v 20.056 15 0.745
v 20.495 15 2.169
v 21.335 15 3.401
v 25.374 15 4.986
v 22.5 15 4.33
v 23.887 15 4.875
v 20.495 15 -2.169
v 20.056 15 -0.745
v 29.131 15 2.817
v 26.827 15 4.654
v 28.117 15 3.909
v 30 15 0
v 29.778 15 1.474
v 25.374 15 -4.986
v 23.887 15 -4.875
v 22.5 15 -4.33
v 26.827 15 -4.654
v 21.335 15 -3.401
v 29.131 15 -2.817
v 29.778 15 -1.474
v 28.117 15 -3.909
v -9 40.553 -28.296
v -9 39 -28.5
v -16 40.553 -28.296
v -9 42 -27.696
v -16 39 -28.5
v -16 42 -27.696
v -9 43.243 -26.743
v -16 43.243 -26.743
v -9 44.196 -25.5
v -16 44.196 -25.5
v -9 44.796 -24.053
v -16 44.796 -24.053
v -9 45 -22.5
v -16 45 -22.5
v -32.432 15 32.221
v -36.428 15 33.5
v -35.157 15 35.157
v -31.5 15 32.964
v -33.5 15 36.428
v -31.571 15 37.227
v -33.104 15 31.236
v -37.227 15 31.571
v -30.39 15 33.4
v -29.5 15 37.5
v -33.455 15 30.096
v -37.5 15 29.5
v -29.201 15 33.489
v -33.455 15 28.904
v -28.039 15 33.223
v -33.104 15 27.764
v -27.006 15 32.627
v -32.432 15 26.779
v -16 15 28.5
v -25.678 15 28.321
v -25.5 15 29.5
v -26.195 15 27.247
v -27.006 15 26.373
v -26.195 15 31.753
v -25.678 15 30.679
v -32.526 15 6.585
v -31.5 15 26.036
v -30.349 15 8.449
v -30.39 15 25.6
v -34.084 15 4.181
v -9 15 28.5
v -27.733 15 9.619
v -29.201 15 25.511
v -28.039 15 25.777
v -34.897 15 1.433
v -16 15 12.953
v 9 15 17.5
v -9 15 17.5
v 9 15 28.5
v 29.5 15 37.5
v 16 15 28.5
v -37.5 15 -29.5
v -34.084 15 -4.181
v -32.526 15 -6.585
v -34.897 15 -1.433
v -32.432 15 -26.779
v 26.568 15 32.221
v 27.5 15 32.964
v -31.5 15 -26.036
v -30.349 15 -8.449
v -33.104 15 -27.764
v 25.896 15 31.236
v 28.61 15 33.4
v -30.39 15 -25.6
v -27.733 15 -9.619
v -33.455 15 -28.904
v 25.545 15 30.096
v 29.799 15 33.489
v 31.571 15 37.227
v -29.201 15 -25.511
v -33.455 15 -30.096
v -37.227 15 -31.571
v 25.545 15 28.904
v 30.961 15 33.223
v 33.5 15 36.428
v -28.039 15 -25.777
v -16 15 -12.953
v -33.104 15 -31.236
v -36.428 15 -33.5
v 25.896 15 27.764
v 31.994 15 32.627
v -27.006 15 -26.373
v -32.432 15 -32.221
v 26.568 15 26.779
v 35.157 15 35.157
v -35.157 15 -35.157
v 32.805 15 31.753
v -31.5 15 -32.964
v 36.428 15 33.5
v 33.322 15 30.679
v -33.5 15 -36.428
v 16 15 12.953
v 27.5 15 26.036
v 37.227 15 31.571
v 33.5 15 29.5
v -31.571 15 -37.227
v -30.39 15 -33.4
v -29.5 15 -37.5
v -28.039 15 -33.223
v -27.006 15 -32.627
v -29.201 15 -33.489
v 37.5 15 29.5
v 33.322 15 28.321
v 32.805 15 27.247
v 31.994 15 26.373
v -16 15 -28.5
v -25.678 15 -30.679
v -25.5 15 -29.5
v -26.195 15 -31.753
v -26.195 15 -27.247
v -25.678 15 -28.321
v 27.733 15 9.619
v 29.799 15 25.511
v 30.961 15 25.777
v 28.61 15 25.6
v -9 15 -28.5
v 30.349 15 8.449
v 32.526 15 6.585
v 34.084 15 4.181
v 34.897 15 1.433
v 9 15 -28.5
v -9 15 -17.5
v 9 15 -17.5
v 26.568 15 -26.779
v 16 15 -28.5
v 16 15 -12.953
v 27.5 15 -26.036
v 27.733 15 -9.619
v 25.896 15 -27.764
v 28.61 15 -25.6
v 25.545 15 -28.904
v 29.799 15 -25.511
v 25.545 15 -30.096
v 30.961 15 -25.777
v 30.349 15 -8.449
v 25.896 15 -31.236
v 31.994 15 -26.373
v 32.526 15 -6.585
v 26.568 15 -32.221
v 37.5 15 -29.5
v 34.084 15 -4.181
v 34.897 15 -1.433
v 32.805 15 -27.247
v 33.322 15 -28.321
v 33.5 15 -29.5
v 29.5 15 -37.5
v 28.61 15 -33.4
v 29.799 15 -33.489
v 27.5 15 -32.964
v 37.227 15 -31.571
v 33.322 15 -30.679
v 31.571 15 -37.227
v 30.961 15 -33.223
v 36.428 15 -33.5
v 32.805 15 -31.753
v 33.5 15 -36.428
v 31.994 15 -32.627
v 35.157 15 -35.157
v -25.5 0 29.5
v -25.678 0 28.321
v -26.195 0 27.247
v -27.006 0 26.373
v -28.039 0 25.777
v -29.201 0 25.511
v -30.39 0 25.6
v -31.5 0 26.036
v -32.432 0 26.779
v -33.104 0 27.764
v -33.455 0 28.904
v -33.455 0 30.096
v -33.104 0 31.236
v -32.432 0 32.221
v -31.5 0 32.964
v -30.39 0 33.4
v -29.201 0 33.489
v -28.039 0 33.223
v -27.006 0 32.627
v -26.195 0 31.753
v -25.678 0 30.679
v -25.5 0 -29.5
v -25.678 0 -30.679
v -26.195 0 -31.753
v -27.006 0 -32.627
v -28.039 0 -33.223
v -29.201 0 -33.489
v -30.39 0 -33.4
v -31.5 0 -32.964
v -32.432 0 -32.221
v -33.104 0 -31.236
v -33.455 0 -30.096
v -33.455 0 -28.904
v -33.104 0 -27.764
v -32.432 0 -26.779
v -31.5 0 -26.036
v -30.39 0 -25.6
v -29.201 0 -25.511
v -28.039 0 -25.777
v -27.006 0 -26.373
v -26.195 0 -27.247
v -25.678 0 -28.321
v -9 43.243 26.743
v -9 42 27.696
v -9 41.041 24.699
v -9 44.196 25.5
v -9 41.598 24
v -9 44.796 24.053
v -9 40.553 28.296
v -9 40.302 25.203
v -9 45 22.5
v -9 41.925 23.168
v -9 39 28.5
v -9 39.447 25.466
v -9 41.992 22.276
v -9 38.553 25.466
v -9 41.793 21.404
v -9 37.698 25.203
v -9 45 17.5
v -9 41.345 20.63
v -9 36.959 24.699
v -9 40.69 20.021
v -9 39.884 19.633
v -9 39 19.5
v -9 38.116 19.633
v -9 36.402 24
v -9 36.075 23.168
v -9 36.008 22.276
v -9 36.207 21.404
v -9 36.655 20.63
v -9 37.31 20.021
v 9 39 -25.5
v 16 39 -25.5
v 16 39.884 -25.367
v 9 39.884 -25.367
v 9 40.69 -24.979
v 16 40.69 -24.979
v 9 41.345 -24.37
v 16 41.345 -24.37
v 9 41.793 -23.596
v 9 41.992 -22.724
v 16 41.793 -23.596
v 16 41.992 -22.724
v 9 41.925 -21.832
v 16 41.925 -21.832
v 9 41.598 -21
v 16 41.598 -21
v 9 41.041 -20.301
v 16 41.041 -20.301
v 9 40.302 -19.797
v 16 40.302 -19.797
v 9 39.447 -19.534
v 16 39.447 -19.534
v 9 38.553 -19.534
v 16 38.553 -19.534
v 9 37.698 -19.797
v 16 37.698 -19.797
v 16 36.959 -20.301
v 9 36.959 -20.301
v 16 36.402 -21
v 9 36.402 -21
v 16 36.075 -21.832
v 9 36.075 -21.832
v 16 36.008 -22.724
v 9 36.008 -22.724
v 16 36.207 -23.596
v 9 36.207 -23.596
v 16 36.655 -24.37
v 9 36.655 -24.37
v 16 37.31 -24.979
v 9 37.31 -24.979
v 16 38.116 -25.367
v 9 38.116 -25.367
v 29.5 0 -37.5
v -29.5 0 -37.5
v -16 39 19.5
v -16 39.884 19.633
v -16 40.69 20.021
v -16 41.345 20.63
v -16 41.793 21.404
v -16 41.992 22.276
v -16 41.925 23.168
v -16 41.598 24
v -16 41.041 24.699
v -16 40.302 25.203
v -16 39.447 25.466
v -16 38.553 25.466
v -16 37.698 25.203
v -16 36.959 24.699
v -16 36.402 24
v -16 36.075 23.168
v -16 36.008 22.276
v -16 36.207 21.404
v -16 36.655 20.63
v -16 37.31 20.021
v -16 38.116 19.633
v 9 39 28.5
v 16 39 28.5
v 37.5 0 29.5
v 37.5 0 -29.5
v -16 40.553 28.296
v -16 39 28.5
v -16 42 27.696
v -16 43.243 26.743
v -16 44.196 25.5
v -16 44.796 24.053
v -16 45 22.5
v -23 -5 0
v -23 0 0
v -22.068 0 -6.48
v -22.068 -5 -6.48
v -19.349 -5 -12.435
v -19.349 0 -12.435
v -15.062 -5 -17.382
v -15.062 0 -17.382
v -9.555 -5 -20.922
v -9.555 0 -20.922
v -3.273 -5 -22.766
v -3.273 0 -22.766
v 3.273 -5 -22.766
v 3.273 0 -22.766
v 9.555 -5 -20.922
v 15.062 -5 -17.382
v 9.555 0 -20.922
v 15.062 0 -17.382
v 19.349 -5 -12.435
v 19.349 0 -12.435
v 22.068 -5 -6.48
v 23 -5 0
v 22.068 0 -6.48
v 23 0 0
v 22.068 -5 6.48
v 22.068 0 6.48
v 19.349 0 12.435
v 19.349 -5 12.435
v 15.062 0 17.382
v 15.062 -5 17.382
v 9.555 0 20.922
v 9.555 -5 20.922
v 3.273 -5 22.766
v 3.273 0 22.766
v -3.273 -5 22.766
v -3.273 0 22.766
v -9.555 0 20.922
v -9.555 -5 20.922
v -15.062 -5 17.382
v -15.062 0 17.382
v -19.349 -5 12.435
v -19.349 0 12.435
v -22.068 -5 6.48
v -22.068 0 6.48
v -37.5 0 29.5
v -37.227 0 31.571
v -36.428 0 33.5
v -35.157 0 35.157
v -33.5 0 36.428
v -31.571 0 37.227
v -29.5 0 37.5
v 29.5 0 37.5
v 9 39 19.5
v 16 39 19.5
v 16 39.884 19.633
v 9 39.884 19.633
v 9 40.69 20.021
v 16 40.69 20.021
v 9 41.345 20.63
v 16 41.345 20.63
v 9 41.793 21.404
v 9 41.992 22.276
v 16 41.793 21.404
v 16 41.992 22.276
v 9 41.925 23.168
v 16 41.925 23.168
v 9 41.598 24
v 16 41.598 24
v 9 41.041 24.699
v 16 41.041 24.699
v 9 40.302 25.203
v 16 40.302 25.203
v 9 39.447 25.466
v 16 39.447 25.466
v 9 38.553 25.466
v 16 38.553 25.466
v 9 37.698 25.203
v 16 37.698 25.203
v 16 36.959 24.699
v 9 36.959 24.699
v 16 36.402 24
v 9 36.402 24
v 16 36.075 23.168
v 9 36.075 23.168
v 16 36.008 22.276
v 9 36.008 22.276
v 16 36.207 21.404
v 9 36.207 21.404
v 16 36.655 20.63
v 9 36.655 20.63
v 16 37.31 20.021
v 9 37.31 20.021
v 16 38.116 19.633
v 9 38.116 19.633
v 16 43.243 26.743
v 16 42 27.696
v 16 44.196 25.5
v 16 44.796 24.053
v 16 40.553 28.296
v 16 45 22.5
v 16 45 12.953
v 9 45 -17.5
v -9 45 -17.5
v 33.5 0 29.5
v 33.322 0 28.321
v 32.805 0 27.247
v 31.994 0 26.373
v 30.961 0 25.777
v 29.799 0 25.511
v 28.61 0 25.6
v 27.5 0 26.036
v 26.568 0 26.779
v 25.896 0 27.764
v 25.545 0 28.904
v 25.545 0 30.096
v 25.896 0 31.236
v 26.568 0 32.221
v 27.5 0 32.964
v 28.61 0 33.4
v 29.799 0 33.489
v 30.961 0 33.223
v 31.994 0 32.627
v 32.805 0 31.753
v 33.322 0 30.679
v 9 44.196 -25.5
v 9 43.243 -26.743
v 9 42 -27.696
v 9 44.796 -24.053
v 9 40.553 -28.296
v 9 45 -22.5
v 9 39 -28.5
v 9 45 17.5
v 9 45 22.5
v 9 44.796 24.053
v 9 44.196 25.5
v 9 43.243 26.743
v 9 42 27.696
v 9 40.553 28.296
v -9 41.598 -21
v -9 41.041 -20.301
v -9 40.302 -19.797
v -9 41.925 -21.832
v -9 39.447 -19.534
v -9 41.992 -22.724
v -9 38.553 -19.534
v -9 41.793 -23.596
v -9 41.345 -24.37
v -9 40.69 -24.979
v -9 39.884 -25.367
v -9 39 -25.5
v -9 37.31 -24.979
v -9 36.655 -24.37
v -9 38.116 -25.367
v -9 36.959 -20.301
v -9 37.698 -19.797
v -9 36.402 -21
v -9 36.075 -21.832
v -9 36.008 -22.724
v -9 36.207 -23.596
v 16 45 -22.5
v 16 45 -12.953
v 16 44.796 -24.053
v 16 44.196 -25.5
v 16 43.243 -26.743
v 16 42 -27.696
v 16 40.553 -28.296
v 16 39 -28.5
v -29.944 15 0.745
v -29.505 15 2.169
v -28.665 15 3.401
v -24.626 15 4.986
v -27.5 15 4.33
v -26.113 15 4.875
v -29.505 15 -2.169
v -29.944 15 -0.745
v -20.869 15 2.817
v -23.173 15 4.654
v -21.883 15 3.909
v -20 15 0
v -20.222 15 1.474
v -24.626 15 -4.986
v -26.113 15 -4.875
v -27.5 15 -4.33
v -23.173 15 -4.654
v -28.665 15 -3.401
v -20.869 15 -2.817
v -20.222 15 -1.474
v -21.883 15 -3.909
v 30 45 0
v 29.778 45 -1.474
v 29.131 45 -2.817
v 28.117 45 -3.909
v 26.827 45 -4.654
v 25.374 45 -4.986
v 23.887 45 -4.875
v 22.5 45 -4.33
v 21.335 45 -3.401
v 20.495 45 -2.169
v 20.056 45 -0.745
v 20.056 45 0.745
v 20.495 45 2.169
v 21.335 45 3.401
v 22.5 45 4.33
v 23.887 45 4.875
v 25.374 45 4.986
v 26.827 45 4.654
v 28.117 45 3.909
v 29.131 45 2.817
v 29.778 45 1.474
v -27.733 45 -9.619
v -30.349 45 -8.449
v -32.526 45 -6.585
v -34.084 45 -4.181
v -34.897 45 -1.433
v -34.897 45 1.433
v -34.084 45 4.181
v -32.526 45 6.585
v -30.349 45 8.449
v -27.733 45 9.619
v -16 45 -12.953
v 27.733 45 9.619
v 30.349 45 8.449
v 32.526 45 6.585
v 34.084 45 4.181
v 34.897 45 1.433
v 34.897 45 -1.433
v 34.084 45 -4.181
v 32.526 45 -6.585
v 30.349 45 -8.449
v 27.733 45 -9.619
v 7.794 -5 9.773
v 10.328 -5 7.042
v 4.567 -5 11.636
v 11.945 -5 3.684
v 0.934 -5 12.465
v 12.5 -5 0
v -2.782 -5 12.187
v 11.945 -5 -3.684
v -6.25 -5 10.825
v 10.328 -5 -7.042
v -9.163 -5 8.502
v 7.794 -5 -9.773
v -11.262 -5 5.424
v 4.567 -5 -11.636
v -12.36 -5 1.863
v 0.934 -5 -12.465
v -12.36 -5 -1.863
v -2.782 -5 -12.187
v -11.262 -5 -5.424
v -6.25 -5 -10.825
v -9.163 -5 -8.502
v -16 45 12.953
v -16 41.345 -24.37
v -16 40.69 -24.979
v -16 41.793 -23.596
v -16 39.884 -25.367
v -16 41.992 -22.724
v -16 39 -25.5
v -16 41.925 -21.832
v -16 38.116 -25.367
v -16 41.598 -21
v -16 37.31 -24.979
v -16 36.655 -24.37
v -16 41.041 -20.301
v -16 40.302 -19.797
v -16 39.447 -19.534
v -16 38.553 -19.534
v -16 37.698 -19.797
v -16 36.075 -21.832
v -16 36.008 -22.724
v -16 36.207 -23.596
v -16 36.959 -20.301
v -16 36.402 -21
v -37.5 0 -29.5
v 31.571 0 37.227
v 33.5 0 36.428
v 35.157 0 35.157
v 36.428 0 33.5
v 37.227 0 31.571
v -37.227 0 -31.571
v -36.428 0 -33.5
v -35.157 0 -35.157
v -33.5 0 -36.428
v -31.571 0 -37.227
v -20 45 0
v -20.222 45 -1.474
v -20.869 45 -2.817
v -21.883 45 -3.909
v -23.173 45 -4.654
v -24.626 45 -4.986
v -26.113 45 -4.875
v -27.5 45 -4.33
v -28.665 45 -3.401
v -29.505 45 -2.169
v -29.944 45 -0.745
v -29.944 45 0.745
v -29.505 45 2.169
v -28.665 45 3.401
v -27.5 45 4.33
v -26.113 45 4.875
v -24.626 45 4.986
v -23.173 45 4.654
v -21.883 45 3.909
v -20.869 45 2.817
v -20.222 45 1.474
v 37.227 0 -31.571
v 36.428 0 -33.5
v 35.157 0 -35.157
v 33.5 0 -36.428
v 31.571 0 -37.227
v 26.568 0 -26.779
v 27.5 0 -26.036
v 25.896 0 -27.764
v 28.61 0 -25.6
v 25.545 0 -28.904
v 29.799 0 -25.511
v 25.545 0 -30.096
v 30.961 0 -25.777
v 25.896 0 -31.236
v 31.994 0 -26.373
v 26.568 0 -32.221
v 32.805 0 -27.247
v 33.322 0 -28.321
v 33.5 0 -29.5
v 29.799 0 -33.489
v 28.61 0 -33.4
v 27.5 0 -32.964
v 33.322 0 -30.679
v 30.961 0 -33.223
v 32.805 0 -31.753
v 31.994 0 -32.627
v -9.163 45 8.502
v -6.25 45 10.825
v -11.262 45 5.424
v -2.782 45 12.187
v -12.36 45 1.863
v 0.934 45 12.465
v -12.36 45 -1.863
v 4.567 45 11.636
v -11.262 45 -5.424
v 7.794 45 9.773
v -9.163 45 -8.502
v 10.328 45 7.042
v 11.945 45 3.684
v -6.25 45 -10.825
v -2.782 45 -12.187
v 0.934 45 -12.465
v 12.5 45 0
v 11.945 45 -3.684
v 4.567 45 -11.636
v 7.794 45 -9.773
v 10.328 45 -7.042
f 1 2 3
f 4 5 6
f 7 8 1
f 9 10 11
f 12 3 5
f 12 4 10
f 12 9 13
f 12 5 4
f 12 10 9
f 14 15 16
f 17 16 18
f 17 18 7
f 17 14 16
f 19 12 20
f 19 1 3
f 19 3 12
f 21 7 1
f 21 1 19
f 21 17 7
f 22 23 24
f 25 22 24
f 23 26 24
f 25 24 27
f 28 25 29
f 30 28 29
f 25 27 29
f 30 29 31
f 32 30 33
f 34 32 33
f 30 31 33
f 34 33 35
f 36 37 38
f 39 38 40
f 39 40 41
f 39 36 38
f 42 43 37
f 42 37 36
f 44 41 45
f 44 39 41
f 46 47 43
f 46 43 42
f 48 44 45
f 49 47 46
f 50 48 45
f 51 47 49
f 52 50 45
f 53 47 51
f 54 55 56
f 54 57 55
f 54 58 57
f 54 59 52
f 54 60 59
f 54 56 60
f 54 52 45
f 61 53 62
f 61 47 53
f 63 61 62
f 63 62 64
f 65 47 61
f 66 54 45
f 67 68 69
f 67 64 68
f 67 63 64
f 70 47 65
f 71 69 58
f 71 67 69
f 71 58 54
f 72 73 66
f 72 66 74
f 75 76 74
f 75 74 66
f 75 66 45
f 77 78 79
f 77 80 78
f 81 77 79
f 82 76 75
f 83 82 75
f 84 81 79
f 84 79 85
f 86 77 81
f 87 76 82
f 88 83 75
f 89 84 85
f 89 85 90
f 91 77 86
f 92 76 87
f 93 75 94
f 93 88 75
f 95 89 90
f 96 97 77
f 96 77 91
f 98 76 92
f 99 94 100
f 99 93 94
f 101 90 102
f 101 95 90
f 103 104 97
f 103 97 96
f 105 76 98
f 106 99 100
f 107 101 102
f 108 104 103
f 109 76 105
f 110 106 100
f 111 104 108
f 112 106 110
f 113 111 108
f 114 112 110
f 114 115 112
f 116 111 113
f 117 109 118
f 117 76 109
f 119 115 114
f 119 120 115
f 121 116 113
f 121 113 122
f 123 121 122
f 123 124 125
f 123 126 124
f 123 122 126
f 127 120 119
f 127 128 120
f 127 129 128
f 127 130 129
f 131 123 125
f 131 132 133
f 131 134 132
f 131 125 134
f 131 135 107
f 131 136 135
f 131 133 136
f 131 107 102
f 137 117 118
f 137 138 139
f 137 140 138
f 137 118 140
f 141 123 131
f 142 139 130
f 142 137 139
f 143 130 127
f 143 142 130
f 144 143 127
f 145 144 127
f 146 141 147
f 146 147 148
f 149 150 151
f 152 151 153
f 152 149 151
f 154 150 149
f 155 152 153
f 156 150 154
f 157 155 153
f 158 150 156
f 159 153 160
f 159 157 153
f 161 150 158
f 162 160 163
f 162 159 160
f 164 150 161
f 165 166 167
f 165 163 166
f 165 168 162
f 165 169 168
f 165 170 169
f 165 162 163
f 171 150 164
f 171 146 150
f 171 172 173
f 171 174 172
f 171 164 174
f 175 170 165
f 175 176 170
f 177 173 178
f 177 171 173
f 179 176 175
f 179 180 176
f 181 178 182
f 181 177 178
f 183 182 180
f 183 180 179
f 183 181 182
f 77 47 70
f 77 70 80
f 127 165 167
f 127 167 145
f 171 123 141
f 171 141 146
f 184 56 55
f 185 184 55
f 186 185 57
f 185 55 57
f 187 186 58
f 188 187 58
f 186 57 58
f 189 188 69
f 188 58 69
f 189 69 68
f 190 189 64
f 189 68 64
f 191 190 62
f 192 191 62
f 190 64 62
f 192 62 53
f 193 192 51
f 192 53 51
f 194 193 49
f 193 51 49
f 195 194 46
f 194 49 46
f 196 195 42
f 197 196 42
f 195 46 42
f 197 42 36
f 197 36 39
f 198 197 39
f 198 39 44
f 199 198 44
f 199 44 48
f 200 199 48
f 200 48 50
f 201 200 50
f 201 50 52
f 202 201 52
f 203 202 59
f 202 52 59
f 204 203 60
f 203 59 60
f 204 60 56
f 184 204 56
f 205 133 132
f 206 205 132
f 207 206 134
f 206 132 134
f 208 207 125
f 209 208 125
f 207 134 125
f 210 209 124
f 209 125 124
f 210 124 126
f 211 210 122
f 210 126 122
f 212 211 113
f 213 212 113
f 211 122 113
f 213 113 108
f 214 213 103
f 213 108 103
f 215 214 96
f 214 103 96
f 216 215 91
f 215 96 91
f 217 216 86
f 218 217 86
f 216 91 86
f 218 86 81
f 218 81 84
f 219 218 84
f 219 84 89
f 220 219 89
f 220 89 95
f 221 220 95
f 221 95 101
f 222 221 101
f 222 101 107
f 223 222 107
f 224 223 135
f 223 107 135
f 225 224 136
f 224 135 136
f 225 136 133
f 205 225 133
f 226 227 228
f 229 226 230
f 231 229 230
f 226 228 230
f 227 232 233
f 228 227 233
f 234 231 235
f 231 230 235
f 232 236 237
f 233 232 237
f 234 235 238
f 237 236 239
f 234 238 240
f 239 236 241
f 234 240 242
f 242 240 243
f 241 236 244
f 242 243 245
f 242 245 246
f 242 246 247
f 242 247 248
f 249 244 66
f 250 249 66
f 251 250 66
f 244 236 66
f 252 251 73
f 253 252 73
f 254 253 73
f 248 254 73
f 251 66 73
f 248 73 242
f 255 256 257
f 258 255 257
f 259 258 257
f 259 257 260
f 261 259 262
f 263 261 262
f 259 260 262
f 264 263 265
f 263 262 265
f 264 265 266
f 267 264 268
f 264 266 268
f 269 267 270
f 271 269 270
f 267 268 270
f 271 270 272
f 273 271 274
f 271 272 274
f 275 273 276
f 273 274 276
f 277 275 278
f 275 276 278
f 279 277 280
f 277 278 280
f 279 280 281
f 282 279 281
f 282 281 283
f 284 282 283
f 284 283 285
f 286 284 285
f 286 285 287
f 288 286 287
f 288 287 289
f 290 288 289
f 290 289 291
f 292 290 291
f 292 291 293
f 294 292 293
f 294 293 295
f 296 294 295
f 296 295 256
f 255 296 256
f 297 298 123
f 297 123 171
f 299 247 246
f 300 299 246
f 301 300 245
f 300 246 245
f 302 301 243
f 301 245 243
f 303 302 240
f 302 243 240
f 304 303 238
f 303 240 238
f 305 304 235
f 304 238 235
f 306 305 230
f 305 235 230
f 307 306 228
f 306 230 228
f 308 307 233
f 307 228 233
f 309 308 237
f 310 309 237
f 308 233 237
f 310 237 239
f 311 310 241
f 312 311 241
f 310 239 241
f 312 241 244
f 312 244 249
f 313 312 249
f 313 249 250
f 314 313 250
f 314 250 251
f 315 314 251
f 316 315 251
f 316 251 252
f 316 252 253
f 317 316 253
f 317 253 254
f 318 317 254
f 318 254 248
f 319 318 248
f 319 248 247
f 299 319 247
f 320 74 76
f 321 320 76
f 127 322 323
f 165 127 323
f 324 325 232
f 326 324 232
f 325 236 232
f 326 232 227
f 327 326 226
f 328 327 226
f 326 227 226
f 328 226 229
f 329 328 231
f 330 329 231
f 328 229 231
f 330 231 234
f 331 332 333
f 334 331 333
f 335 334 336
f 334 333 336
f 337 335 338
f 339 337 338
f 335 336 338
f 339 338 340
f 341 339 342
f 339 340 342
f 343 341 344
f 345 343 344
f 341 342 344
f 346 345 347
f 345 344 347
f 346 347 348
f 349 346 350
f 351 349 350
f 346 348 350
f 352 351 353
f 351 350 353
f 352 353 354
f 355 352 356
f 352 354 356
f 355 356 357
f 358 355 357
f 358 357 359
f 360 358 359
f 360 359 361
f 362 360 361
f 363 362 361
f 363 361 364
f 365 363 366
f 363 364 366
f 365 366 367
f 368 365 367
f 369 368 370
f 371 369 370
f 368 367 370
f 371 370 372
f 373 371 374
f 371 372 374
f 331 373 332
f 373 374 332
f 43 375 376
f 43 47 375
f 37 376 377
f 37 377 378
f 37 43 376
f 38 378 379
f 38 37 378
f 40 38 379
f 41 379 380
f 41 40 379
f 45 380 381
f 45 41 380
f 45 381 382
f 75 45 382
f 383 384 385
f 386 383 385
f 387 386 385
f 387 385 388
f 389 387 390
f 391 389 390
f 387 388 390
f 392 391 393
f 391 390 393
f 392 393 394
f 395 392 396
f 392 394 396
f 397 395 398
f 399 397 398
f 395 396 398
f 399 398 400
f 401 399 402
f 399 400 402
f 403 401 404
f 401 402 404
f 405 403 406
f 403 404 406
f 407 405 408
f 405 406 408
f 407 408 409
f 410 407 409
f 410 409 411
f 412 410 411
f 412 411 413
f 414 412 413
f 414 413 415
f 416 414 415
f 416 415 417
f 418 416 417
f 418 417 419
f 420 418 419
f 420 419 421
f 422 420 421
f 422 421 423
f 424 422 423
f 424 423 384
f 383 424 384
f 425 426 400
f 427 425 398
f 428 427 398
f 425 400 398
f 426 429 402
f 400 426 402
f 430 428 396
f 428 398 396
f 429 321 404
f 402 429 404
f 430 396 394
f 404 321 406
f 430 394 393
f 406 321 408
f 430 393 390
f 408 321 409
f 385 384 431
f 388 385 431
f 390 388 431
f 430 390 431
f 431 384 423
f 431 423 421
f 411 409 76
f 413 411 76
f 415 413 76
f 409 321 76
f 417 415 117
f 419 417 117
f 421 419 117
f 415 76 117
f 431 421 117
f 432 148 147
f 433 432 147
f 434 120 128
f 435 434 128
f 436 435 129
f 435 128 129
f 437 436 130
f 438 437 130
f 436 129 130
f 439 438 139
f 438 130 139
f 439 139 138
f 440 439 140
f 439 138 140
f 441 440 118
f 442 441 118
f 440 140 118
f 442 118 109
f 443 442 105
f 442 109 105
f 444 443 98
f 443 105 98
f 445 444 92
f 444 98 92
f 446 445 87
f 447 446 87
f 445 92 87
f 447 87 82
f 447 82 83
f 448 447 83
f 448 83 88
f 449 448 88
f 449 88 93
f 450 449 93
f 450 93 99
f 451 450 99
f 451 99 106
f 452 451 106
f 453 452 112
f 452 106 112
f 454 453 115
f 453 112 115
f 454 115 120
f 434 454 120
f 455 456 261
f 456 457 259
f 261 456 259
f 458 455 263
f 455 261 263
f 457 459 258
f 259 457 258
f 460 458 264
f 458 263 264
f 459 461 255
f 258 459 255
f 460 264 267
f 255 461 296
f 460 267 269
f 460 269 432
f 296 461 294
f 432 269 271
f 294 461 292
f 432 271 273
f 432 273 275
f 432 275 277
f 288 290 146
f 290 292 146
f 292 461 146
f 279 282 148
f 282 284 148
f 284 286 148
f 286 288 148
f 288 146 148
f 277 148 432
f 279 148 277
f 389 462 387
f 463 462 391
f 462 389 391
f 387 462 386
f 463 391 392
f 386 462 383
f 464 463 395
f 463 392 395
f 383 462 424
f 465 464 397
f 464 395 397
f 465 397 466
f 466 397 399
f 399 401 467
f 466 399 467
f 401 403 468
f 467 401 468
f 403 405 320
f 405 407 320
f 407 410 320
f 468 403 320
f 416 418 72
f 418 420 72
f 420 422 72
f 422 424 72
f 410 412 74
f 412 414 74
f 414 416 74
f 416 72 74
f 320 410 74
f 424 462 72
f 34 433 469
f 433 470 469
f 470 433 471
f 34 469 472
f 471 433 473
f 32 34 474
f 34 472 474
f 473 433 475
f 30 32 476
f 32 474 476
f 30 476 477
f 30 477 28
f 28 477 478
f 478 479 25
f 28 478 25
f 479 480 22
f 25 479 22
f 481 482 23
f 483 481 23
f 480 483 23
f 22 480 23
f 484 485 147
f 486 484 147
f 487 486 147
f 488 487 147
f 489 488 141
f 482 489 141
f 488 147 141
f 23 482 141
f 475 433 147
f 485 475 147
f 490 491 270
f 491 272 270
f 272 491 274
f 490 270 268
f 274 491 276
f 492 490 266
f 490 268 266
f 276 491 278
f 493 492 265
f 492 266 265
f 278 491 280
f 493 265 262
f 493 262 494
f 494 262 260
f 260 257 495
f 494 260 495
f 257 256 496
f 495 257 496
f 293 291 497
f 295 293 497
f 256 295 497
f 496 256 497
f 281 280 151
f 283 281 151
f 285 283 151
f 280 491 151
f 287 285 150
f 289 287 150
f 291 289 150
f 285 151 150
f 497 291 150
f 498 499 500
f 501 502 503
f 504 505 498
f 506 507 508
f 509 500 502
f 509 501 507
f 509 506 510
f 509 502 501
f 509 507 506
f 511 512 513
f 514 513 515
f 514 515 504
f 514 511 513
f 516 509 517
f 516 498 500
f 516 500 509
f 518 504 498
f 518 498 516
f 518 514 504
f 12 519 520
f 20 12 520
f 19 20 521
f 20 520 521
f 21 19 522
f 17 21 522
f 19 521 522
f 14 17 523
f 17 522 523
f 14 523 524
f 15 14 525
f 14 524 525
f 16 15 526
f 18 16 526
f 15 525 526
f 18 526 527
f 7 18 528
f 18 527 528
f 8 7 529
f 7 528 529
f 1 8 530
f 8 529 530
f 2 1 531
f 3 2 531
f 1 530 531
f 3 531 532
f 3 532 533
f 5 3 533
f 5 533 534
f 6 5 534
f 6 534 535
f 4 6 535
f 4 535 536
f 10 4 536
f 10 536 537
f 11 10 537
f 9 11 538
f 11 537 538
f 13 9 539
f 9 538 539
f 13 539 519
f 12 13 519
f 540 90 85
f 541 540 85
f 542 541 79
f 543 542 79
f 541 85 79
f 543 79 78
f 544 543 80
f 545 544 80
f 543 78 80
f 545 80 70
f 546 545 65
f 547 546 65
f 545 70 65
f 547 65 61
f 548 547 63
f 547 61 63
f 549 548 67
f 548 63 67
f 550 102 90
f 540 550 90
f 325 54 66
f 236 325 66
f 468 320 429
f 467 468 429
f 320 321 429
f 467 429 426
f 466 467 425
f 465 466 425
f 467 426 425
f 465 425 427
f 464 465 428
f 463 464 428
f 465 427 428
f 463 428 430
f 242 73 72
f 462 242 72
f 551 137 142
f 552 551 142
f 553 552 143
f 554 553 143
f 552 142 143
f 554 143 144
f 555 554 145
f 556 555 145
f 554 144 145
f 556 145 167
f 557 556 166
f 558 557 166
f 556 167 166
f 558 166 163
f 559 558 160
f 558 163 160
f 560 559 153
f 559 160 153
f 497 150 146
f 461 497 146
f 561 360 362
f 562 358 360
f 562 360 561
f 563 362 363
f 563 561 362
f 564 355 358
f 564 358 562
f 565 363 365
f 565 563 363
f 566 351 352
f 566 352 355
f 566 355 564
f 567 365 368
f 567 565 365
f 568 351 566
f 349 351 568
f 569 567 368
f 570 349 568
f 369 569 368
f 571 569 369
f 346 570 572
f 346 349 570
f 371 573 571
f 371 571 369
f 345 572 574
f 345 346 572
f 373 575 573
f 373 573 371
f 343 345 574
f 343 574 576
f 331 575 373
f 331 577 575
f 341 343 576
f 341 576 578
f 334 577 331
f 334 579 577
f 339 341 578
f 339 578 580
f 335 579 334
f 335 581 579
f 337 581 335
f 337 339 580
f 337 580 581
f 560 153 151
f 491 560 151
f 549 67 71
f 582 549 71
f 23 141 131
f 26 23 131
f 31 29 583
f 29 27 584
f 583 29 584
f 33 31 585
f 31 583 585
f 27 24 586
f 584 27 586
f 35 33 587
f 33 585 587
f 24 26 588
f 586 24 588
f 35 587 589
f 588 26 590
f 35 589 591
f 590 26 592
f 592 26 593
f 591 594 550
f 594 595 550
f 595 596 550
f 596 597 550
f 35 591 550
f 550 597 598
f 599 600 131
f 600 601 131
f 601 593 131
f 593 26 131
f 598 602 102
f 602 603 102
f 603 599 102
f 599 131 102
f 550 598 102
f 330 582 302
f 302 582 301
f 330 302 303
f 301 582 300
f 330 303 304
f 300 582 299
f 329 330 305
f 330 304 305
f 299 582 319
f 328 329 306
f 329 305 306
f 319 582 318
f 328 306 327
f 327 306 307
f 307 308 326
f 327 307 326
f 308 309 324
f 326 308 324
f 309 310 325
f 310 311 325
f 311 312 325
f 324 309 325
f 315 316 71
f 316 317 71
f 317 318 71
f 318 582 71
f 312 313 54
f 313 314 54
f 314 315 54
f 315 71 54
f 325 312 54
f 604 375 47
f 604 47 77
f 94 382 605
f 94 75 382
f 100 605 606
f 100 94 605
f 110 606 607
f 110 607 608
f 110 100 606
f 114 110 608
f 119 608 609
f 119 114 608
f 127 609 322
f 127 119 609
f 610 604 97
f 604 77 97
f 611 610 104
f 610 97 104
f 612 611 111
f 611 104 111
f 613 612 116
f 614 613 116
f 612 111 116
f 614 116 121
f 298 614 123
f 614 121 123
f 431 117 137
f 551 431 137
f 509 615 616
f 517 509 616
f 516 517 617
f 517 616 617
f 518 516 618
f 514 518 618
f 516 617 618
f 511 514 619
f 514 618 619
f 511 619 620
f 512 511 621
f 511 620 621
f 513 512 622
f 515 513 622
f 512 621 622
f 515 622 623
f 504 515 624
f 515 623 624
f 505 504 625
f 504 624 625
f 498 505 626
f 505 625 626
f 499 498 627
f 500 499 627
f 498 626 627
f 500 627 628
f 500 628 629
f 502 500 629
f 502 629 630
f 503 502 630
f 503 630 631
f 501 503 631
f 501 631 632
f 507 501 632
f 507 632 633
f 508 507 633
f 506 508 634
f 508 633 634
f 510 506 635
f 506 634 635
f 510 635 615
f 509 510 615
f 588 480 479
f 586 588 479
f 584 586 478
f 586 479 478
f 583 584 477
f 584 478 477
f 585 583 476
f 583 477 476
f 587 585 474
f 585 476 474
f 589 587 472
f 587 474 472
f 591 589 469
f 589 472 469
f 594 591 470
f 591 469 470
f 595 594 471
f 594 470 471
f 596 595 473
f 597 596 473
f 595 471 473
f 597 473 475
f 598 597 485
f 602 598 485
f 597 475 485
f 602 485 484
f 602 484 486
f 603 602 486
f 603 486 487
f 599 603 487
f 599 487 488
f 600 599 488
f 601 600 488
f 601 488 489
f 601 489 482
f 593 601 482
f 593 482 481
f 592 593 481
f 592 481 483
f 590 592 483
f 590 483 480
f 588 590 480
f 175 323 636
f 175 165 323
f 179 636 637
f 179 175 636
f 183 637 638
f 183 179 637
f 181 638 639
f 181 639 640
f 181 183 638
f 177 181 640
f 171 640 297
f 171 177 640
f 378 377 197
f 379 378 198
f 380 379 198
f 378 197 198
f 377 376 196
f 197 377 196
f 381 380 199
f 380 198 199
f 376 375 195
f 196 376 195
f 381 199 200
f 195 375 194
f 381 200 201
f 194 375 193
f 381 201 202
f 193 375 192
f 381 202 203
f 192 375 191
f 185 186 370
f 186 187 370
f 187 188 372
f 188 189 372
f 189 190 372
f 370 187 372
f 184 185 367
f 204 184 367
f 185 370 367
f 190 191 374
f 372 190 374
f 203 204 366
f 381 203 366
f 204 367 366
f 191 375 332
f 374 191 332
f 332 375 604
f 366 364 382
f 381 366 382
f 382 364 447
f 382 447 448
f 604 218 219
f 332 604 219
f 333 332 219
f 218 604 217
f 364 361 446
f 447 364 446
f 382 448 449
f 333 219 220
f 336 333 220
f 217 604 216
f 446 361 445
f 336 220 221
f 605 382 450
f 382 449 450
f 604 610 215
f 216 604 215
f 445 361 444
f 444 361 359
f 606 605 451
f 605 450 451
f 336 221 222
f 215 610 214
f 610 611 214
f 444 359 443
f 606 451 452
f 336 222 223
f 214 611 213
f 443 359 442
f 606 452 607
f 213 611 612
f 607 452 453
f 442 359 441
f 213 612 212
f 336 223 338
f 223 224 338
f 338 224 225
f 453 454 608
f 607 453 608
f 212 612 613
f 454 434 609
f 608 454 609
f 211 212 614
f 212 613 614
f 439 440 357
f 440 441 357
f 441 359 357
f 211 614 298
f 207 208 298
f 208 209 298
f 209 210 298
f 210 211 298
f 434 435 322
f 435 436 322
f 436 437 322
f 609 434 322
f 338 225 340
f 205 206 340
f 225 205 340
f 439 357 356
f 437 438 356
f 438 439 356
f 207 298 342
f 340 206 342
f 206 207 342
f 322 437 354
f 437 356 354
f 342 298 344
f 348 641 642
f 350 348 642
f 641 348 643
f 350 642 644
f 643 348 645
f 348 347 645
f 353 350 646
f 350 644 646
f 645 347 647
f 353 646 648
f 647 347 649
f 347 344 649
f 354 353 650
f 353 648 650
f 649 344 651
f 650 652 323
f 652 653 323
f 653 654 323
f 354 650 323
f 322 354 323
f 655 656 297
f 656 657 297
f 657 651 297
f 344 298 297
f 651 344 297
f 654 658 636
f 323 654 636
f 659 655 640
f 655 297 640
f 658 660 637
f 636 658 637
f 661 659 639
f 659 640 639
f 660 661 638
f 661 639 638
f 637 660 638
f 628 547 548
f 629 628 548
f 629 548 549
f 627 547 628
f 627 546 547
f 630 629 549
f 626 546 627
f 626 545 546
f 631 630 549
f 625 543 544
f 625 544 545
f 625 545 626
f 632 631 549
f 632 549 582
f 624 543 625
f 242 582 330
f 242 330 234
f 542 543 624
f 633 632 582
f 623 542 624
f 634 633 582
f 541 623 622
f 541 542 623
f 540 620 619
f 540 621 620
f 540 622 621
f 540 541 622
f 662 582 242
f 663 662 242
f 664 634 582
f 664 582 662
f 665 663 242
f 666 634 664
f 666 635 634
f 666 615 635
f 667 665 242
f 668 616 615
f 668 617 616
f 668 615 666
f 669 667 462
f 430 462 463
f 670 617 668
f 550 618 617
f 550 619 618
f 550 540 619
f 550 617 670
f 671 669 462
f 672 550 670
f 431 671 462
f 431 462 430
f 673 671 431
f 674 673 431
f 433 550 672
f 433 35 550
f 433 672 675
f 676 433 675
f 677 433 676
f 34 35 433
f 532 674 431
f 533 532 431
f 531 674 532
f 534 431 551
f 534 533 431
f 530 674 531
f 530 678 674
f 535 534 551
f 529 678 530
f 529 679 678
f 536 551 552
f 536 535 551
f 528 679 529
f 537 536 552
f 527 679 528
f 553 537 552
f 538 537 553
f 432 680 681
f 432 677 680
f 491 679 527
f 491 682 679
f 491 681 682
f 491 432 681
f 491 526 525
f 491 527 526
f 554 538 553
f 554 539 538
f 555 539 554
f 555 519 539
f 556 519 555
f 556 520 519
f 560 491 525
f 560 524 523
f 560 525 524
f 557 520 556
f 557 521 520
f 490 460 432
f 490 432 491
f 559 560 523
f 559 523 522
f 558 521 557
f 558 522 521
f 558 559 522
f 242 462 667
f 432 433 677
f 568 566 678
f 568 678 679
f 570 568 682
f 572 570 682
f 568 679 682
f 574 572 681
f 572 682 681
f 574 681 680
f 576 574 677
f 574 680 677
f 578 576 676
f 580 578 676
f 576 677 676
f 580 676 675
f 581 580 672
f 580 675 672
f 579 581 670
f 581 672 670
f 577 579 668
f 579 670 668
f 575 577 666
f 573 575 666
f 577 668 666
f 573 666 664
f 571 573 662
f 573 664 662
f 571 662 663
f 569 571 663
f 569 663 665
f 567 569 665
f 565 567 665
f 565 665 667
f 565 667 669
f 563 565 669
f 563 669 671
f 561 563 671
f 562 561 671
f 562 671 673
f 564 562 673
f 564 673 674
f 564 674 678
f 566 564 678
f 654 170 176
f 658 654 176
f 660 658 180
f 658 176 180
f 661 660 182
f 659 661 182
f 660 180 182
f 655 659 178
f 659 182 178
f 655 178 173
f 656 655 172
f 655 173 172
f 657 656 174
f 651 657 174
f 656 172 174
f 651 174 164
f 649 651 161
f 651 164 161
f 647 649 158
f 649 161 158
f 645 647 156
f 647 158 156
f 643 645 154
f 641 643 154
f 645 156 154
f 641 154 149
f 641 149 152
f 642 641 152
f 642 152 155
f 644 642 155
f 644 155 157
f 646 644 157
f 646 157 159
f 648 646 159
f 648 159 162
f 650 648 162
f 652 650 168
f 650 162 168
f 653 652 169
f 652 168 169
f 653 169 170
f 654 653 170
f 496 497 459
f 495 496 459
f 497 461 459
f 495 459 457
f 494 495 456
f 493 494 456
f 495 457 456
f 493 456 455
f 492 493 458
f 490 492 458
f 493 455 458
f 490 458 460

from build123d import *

# Parameters (mm, degrees)
CROQUIS1_W              = 75
CROQUIS1_H              = 75
SALIENTE_EXTRUIR1_DEPTH = 15
REDONDEO1_R             = 8
CROQUIS2_R              = 4
CORTAR_EXTRUIR1_DEPTH   = 15
SALIENTE_EXTRUIR2_DEPTH = 30
REDONDEO2_R             = 6
CROQUIS5_R              = 3
CORTAR_EXTRUIR2_DEPTH   = 54.5
CROQUIS6_R              = 5
CORTAR_EXTRUIR4_DEPTH   = 30
CROQUIS4_R              = 23
SALIENTE_EXTRUIR4_DEPTH = 5
CROQUIS8_R              = 12.5
CORTAR_EXTRUIR6_DEPTH   = 51


with BuildPart() as part:
    # Croquis1 → Saliente-Extruir1 (new body)
    with BuildSketch(Plane(origin=(0, 0, 0), x_dir=(1, 0, 0), z_dir=(0, 1, 0))):
        Rectangle(CROQUIS1_W, CROQUIS1_H)
    extrude(amount=SALIENTE_EXTRUIR1_DEPTH)

    # Redondeo1
    redondeo1_edges = [part.edges().sort_by_distance(p)[0] for p in [
        (37.5, 7.5, 37.5),
        (-37.5, 7.5, 37.5),
        (-37.5, 7.5, -37.5),
        (37.5, 7.5, -37.5),
    ]]
    fillet(redondeo1_edges, radius=REDONDEO1_R)

    # Croquis2 → Cortar-Extruir1 (cut)
    with BuildSketch(Plane(origin=(0, 15, 0), x_dir=(1, 0, 0), z_dir=(0, 1, 0))):
        with Locations((-29.5, 29.5)):
            Circle(CROQUIS2_R)
        with Locations((-29.5, -29.5)):
            Circle(CROQUIS2_R)
        with Locations((29.5, 29.5)):
            Circle(CROQUIS2_R)
        with Locations((29.5, -29.5)):
            Circle(CROQUIS2_R)
    extrude(amount=-CORTAR_EXTRUIR1_DEPTH, mode=Mode.SUBTRACT)

    # Croquis3 → Saliente-Extruir2 (add)
    with BuildSketch(Plane(origin=(0, 15, 0), x_dir=(1, 0, 0), z_dir=(0, 1, 0))):
        with BuildLine():
            Line((-16, -28.5), (-9, -28.5))
            Line((-9, -28.5), (-9, -17.5))
            Line((-9, -17.5), (9, -17.5))
            Line((9, -17.5), (9, -28.5))
            Line((9, -28.5), (16, -28.5))
            Line((16, -28.5), (16, -12.953381025))
            Line((16, -12.953381025), (27.733418669, -9.619169527))
            ThreePointArc((27.733418669, -9.619169527), (35, 0), (27.733418669, 9.619169527))
            Line((27.733418669, 9.619169527), (16, 12.953381025))
            Line((16, 12.953381025), (16, 28.5))
            Line((16, 28.5), (9, 28.5))
            Line((9, 28.5), (9, 17.5))
            Line((9, 17.5), (-9, 17.5))
            Line((-9, 17.5), (-9, 28.5))
            Line((-9, 28.5), (-16, 28.5))
            Line((-16, 28.5), (-16, 12.953381025))
            Line((-16, 12.953381025), (-27.733418669, 9.619169527))
            ThreePointArc((-27.733418669, 9.619169527), (-35, 0), (-27.733418669, -9.619169527))
            Line((-27.733418669, -9.619169527), (-16, -12.953381025))
            Line((-16, -12.953381025), (-16, -28.5))
        make_face()
    extrude(amount=SALIENTE_EXTRUIR2_DEPTH)

    # Redondeo2
    redondeo2_edges = [part.edges().sort_by_distance(p)[0] for p in [
        (-12.5, 45, 28.5),
        (12.5, 45, 28.5),
        (12.5, 45, -28.5),
        (-12.5, 45, -28.5),
    ]]
    fillet(redondeo2_edges, radius=REDONDEO2_R)

    # Croquis5 → Cortar-Extruir2 (cut, through all)
    with BuildSketch(Plane(origin=(16, 0, 0), x_dir=(0, 0, -1), z_dir=(1, 0, 0))):
        with Locations((-22.5, 39)):
            Circle(CROQUIS5_R)
        with Locations((22.5, 39)):
            Circle(CROQUIS5_R)
    extrude(amount=-CORTAR_EXTRUIR2_DEPTH, mode=Mode.SUBTRACT)

    # Croquis6 → Cortar-Extruir4 (cut)
    with BuildSketch(Plane(origin=(0, 45, 0), x_dir=(1, 0, 0), z_dir=(0, 1, 0))):
        with Locations((-25, 0)):
            Circle(CROQUIS6_R)
        with Locations((25, 0)):
            Circle(CROQUIS6_R)
    extrude(amount=-CORTAR_EXTRUIR4_DEPTH, mode=Mode.SUBTRACT)

    # Croquis4 → Saliente-Extruir4 (add)
    with BuildSketch(Plane(origin=(0, 0, 0), x_dir=(-1, 0, 0), z_dir=(0, -1, 0))):
        Circle(CROQUIS4_R)
    extrude(amount=SALIENTE_EXTRUIR4_DEPTH)

    # Croquis8 → Cortar-Extruir6 (cut, through all)
    with BuildSketch(Plane(origin=(0, 45, 0), x_dir=(1, 0, 0), z_dir=(0, 1, 0))):
        Circle(CROQUIS8_R)
    extrude(amount=-CORTAR_EXTRUIR6_DEPTH, mode=Mode.SUBTRACT)


solid = part.part
